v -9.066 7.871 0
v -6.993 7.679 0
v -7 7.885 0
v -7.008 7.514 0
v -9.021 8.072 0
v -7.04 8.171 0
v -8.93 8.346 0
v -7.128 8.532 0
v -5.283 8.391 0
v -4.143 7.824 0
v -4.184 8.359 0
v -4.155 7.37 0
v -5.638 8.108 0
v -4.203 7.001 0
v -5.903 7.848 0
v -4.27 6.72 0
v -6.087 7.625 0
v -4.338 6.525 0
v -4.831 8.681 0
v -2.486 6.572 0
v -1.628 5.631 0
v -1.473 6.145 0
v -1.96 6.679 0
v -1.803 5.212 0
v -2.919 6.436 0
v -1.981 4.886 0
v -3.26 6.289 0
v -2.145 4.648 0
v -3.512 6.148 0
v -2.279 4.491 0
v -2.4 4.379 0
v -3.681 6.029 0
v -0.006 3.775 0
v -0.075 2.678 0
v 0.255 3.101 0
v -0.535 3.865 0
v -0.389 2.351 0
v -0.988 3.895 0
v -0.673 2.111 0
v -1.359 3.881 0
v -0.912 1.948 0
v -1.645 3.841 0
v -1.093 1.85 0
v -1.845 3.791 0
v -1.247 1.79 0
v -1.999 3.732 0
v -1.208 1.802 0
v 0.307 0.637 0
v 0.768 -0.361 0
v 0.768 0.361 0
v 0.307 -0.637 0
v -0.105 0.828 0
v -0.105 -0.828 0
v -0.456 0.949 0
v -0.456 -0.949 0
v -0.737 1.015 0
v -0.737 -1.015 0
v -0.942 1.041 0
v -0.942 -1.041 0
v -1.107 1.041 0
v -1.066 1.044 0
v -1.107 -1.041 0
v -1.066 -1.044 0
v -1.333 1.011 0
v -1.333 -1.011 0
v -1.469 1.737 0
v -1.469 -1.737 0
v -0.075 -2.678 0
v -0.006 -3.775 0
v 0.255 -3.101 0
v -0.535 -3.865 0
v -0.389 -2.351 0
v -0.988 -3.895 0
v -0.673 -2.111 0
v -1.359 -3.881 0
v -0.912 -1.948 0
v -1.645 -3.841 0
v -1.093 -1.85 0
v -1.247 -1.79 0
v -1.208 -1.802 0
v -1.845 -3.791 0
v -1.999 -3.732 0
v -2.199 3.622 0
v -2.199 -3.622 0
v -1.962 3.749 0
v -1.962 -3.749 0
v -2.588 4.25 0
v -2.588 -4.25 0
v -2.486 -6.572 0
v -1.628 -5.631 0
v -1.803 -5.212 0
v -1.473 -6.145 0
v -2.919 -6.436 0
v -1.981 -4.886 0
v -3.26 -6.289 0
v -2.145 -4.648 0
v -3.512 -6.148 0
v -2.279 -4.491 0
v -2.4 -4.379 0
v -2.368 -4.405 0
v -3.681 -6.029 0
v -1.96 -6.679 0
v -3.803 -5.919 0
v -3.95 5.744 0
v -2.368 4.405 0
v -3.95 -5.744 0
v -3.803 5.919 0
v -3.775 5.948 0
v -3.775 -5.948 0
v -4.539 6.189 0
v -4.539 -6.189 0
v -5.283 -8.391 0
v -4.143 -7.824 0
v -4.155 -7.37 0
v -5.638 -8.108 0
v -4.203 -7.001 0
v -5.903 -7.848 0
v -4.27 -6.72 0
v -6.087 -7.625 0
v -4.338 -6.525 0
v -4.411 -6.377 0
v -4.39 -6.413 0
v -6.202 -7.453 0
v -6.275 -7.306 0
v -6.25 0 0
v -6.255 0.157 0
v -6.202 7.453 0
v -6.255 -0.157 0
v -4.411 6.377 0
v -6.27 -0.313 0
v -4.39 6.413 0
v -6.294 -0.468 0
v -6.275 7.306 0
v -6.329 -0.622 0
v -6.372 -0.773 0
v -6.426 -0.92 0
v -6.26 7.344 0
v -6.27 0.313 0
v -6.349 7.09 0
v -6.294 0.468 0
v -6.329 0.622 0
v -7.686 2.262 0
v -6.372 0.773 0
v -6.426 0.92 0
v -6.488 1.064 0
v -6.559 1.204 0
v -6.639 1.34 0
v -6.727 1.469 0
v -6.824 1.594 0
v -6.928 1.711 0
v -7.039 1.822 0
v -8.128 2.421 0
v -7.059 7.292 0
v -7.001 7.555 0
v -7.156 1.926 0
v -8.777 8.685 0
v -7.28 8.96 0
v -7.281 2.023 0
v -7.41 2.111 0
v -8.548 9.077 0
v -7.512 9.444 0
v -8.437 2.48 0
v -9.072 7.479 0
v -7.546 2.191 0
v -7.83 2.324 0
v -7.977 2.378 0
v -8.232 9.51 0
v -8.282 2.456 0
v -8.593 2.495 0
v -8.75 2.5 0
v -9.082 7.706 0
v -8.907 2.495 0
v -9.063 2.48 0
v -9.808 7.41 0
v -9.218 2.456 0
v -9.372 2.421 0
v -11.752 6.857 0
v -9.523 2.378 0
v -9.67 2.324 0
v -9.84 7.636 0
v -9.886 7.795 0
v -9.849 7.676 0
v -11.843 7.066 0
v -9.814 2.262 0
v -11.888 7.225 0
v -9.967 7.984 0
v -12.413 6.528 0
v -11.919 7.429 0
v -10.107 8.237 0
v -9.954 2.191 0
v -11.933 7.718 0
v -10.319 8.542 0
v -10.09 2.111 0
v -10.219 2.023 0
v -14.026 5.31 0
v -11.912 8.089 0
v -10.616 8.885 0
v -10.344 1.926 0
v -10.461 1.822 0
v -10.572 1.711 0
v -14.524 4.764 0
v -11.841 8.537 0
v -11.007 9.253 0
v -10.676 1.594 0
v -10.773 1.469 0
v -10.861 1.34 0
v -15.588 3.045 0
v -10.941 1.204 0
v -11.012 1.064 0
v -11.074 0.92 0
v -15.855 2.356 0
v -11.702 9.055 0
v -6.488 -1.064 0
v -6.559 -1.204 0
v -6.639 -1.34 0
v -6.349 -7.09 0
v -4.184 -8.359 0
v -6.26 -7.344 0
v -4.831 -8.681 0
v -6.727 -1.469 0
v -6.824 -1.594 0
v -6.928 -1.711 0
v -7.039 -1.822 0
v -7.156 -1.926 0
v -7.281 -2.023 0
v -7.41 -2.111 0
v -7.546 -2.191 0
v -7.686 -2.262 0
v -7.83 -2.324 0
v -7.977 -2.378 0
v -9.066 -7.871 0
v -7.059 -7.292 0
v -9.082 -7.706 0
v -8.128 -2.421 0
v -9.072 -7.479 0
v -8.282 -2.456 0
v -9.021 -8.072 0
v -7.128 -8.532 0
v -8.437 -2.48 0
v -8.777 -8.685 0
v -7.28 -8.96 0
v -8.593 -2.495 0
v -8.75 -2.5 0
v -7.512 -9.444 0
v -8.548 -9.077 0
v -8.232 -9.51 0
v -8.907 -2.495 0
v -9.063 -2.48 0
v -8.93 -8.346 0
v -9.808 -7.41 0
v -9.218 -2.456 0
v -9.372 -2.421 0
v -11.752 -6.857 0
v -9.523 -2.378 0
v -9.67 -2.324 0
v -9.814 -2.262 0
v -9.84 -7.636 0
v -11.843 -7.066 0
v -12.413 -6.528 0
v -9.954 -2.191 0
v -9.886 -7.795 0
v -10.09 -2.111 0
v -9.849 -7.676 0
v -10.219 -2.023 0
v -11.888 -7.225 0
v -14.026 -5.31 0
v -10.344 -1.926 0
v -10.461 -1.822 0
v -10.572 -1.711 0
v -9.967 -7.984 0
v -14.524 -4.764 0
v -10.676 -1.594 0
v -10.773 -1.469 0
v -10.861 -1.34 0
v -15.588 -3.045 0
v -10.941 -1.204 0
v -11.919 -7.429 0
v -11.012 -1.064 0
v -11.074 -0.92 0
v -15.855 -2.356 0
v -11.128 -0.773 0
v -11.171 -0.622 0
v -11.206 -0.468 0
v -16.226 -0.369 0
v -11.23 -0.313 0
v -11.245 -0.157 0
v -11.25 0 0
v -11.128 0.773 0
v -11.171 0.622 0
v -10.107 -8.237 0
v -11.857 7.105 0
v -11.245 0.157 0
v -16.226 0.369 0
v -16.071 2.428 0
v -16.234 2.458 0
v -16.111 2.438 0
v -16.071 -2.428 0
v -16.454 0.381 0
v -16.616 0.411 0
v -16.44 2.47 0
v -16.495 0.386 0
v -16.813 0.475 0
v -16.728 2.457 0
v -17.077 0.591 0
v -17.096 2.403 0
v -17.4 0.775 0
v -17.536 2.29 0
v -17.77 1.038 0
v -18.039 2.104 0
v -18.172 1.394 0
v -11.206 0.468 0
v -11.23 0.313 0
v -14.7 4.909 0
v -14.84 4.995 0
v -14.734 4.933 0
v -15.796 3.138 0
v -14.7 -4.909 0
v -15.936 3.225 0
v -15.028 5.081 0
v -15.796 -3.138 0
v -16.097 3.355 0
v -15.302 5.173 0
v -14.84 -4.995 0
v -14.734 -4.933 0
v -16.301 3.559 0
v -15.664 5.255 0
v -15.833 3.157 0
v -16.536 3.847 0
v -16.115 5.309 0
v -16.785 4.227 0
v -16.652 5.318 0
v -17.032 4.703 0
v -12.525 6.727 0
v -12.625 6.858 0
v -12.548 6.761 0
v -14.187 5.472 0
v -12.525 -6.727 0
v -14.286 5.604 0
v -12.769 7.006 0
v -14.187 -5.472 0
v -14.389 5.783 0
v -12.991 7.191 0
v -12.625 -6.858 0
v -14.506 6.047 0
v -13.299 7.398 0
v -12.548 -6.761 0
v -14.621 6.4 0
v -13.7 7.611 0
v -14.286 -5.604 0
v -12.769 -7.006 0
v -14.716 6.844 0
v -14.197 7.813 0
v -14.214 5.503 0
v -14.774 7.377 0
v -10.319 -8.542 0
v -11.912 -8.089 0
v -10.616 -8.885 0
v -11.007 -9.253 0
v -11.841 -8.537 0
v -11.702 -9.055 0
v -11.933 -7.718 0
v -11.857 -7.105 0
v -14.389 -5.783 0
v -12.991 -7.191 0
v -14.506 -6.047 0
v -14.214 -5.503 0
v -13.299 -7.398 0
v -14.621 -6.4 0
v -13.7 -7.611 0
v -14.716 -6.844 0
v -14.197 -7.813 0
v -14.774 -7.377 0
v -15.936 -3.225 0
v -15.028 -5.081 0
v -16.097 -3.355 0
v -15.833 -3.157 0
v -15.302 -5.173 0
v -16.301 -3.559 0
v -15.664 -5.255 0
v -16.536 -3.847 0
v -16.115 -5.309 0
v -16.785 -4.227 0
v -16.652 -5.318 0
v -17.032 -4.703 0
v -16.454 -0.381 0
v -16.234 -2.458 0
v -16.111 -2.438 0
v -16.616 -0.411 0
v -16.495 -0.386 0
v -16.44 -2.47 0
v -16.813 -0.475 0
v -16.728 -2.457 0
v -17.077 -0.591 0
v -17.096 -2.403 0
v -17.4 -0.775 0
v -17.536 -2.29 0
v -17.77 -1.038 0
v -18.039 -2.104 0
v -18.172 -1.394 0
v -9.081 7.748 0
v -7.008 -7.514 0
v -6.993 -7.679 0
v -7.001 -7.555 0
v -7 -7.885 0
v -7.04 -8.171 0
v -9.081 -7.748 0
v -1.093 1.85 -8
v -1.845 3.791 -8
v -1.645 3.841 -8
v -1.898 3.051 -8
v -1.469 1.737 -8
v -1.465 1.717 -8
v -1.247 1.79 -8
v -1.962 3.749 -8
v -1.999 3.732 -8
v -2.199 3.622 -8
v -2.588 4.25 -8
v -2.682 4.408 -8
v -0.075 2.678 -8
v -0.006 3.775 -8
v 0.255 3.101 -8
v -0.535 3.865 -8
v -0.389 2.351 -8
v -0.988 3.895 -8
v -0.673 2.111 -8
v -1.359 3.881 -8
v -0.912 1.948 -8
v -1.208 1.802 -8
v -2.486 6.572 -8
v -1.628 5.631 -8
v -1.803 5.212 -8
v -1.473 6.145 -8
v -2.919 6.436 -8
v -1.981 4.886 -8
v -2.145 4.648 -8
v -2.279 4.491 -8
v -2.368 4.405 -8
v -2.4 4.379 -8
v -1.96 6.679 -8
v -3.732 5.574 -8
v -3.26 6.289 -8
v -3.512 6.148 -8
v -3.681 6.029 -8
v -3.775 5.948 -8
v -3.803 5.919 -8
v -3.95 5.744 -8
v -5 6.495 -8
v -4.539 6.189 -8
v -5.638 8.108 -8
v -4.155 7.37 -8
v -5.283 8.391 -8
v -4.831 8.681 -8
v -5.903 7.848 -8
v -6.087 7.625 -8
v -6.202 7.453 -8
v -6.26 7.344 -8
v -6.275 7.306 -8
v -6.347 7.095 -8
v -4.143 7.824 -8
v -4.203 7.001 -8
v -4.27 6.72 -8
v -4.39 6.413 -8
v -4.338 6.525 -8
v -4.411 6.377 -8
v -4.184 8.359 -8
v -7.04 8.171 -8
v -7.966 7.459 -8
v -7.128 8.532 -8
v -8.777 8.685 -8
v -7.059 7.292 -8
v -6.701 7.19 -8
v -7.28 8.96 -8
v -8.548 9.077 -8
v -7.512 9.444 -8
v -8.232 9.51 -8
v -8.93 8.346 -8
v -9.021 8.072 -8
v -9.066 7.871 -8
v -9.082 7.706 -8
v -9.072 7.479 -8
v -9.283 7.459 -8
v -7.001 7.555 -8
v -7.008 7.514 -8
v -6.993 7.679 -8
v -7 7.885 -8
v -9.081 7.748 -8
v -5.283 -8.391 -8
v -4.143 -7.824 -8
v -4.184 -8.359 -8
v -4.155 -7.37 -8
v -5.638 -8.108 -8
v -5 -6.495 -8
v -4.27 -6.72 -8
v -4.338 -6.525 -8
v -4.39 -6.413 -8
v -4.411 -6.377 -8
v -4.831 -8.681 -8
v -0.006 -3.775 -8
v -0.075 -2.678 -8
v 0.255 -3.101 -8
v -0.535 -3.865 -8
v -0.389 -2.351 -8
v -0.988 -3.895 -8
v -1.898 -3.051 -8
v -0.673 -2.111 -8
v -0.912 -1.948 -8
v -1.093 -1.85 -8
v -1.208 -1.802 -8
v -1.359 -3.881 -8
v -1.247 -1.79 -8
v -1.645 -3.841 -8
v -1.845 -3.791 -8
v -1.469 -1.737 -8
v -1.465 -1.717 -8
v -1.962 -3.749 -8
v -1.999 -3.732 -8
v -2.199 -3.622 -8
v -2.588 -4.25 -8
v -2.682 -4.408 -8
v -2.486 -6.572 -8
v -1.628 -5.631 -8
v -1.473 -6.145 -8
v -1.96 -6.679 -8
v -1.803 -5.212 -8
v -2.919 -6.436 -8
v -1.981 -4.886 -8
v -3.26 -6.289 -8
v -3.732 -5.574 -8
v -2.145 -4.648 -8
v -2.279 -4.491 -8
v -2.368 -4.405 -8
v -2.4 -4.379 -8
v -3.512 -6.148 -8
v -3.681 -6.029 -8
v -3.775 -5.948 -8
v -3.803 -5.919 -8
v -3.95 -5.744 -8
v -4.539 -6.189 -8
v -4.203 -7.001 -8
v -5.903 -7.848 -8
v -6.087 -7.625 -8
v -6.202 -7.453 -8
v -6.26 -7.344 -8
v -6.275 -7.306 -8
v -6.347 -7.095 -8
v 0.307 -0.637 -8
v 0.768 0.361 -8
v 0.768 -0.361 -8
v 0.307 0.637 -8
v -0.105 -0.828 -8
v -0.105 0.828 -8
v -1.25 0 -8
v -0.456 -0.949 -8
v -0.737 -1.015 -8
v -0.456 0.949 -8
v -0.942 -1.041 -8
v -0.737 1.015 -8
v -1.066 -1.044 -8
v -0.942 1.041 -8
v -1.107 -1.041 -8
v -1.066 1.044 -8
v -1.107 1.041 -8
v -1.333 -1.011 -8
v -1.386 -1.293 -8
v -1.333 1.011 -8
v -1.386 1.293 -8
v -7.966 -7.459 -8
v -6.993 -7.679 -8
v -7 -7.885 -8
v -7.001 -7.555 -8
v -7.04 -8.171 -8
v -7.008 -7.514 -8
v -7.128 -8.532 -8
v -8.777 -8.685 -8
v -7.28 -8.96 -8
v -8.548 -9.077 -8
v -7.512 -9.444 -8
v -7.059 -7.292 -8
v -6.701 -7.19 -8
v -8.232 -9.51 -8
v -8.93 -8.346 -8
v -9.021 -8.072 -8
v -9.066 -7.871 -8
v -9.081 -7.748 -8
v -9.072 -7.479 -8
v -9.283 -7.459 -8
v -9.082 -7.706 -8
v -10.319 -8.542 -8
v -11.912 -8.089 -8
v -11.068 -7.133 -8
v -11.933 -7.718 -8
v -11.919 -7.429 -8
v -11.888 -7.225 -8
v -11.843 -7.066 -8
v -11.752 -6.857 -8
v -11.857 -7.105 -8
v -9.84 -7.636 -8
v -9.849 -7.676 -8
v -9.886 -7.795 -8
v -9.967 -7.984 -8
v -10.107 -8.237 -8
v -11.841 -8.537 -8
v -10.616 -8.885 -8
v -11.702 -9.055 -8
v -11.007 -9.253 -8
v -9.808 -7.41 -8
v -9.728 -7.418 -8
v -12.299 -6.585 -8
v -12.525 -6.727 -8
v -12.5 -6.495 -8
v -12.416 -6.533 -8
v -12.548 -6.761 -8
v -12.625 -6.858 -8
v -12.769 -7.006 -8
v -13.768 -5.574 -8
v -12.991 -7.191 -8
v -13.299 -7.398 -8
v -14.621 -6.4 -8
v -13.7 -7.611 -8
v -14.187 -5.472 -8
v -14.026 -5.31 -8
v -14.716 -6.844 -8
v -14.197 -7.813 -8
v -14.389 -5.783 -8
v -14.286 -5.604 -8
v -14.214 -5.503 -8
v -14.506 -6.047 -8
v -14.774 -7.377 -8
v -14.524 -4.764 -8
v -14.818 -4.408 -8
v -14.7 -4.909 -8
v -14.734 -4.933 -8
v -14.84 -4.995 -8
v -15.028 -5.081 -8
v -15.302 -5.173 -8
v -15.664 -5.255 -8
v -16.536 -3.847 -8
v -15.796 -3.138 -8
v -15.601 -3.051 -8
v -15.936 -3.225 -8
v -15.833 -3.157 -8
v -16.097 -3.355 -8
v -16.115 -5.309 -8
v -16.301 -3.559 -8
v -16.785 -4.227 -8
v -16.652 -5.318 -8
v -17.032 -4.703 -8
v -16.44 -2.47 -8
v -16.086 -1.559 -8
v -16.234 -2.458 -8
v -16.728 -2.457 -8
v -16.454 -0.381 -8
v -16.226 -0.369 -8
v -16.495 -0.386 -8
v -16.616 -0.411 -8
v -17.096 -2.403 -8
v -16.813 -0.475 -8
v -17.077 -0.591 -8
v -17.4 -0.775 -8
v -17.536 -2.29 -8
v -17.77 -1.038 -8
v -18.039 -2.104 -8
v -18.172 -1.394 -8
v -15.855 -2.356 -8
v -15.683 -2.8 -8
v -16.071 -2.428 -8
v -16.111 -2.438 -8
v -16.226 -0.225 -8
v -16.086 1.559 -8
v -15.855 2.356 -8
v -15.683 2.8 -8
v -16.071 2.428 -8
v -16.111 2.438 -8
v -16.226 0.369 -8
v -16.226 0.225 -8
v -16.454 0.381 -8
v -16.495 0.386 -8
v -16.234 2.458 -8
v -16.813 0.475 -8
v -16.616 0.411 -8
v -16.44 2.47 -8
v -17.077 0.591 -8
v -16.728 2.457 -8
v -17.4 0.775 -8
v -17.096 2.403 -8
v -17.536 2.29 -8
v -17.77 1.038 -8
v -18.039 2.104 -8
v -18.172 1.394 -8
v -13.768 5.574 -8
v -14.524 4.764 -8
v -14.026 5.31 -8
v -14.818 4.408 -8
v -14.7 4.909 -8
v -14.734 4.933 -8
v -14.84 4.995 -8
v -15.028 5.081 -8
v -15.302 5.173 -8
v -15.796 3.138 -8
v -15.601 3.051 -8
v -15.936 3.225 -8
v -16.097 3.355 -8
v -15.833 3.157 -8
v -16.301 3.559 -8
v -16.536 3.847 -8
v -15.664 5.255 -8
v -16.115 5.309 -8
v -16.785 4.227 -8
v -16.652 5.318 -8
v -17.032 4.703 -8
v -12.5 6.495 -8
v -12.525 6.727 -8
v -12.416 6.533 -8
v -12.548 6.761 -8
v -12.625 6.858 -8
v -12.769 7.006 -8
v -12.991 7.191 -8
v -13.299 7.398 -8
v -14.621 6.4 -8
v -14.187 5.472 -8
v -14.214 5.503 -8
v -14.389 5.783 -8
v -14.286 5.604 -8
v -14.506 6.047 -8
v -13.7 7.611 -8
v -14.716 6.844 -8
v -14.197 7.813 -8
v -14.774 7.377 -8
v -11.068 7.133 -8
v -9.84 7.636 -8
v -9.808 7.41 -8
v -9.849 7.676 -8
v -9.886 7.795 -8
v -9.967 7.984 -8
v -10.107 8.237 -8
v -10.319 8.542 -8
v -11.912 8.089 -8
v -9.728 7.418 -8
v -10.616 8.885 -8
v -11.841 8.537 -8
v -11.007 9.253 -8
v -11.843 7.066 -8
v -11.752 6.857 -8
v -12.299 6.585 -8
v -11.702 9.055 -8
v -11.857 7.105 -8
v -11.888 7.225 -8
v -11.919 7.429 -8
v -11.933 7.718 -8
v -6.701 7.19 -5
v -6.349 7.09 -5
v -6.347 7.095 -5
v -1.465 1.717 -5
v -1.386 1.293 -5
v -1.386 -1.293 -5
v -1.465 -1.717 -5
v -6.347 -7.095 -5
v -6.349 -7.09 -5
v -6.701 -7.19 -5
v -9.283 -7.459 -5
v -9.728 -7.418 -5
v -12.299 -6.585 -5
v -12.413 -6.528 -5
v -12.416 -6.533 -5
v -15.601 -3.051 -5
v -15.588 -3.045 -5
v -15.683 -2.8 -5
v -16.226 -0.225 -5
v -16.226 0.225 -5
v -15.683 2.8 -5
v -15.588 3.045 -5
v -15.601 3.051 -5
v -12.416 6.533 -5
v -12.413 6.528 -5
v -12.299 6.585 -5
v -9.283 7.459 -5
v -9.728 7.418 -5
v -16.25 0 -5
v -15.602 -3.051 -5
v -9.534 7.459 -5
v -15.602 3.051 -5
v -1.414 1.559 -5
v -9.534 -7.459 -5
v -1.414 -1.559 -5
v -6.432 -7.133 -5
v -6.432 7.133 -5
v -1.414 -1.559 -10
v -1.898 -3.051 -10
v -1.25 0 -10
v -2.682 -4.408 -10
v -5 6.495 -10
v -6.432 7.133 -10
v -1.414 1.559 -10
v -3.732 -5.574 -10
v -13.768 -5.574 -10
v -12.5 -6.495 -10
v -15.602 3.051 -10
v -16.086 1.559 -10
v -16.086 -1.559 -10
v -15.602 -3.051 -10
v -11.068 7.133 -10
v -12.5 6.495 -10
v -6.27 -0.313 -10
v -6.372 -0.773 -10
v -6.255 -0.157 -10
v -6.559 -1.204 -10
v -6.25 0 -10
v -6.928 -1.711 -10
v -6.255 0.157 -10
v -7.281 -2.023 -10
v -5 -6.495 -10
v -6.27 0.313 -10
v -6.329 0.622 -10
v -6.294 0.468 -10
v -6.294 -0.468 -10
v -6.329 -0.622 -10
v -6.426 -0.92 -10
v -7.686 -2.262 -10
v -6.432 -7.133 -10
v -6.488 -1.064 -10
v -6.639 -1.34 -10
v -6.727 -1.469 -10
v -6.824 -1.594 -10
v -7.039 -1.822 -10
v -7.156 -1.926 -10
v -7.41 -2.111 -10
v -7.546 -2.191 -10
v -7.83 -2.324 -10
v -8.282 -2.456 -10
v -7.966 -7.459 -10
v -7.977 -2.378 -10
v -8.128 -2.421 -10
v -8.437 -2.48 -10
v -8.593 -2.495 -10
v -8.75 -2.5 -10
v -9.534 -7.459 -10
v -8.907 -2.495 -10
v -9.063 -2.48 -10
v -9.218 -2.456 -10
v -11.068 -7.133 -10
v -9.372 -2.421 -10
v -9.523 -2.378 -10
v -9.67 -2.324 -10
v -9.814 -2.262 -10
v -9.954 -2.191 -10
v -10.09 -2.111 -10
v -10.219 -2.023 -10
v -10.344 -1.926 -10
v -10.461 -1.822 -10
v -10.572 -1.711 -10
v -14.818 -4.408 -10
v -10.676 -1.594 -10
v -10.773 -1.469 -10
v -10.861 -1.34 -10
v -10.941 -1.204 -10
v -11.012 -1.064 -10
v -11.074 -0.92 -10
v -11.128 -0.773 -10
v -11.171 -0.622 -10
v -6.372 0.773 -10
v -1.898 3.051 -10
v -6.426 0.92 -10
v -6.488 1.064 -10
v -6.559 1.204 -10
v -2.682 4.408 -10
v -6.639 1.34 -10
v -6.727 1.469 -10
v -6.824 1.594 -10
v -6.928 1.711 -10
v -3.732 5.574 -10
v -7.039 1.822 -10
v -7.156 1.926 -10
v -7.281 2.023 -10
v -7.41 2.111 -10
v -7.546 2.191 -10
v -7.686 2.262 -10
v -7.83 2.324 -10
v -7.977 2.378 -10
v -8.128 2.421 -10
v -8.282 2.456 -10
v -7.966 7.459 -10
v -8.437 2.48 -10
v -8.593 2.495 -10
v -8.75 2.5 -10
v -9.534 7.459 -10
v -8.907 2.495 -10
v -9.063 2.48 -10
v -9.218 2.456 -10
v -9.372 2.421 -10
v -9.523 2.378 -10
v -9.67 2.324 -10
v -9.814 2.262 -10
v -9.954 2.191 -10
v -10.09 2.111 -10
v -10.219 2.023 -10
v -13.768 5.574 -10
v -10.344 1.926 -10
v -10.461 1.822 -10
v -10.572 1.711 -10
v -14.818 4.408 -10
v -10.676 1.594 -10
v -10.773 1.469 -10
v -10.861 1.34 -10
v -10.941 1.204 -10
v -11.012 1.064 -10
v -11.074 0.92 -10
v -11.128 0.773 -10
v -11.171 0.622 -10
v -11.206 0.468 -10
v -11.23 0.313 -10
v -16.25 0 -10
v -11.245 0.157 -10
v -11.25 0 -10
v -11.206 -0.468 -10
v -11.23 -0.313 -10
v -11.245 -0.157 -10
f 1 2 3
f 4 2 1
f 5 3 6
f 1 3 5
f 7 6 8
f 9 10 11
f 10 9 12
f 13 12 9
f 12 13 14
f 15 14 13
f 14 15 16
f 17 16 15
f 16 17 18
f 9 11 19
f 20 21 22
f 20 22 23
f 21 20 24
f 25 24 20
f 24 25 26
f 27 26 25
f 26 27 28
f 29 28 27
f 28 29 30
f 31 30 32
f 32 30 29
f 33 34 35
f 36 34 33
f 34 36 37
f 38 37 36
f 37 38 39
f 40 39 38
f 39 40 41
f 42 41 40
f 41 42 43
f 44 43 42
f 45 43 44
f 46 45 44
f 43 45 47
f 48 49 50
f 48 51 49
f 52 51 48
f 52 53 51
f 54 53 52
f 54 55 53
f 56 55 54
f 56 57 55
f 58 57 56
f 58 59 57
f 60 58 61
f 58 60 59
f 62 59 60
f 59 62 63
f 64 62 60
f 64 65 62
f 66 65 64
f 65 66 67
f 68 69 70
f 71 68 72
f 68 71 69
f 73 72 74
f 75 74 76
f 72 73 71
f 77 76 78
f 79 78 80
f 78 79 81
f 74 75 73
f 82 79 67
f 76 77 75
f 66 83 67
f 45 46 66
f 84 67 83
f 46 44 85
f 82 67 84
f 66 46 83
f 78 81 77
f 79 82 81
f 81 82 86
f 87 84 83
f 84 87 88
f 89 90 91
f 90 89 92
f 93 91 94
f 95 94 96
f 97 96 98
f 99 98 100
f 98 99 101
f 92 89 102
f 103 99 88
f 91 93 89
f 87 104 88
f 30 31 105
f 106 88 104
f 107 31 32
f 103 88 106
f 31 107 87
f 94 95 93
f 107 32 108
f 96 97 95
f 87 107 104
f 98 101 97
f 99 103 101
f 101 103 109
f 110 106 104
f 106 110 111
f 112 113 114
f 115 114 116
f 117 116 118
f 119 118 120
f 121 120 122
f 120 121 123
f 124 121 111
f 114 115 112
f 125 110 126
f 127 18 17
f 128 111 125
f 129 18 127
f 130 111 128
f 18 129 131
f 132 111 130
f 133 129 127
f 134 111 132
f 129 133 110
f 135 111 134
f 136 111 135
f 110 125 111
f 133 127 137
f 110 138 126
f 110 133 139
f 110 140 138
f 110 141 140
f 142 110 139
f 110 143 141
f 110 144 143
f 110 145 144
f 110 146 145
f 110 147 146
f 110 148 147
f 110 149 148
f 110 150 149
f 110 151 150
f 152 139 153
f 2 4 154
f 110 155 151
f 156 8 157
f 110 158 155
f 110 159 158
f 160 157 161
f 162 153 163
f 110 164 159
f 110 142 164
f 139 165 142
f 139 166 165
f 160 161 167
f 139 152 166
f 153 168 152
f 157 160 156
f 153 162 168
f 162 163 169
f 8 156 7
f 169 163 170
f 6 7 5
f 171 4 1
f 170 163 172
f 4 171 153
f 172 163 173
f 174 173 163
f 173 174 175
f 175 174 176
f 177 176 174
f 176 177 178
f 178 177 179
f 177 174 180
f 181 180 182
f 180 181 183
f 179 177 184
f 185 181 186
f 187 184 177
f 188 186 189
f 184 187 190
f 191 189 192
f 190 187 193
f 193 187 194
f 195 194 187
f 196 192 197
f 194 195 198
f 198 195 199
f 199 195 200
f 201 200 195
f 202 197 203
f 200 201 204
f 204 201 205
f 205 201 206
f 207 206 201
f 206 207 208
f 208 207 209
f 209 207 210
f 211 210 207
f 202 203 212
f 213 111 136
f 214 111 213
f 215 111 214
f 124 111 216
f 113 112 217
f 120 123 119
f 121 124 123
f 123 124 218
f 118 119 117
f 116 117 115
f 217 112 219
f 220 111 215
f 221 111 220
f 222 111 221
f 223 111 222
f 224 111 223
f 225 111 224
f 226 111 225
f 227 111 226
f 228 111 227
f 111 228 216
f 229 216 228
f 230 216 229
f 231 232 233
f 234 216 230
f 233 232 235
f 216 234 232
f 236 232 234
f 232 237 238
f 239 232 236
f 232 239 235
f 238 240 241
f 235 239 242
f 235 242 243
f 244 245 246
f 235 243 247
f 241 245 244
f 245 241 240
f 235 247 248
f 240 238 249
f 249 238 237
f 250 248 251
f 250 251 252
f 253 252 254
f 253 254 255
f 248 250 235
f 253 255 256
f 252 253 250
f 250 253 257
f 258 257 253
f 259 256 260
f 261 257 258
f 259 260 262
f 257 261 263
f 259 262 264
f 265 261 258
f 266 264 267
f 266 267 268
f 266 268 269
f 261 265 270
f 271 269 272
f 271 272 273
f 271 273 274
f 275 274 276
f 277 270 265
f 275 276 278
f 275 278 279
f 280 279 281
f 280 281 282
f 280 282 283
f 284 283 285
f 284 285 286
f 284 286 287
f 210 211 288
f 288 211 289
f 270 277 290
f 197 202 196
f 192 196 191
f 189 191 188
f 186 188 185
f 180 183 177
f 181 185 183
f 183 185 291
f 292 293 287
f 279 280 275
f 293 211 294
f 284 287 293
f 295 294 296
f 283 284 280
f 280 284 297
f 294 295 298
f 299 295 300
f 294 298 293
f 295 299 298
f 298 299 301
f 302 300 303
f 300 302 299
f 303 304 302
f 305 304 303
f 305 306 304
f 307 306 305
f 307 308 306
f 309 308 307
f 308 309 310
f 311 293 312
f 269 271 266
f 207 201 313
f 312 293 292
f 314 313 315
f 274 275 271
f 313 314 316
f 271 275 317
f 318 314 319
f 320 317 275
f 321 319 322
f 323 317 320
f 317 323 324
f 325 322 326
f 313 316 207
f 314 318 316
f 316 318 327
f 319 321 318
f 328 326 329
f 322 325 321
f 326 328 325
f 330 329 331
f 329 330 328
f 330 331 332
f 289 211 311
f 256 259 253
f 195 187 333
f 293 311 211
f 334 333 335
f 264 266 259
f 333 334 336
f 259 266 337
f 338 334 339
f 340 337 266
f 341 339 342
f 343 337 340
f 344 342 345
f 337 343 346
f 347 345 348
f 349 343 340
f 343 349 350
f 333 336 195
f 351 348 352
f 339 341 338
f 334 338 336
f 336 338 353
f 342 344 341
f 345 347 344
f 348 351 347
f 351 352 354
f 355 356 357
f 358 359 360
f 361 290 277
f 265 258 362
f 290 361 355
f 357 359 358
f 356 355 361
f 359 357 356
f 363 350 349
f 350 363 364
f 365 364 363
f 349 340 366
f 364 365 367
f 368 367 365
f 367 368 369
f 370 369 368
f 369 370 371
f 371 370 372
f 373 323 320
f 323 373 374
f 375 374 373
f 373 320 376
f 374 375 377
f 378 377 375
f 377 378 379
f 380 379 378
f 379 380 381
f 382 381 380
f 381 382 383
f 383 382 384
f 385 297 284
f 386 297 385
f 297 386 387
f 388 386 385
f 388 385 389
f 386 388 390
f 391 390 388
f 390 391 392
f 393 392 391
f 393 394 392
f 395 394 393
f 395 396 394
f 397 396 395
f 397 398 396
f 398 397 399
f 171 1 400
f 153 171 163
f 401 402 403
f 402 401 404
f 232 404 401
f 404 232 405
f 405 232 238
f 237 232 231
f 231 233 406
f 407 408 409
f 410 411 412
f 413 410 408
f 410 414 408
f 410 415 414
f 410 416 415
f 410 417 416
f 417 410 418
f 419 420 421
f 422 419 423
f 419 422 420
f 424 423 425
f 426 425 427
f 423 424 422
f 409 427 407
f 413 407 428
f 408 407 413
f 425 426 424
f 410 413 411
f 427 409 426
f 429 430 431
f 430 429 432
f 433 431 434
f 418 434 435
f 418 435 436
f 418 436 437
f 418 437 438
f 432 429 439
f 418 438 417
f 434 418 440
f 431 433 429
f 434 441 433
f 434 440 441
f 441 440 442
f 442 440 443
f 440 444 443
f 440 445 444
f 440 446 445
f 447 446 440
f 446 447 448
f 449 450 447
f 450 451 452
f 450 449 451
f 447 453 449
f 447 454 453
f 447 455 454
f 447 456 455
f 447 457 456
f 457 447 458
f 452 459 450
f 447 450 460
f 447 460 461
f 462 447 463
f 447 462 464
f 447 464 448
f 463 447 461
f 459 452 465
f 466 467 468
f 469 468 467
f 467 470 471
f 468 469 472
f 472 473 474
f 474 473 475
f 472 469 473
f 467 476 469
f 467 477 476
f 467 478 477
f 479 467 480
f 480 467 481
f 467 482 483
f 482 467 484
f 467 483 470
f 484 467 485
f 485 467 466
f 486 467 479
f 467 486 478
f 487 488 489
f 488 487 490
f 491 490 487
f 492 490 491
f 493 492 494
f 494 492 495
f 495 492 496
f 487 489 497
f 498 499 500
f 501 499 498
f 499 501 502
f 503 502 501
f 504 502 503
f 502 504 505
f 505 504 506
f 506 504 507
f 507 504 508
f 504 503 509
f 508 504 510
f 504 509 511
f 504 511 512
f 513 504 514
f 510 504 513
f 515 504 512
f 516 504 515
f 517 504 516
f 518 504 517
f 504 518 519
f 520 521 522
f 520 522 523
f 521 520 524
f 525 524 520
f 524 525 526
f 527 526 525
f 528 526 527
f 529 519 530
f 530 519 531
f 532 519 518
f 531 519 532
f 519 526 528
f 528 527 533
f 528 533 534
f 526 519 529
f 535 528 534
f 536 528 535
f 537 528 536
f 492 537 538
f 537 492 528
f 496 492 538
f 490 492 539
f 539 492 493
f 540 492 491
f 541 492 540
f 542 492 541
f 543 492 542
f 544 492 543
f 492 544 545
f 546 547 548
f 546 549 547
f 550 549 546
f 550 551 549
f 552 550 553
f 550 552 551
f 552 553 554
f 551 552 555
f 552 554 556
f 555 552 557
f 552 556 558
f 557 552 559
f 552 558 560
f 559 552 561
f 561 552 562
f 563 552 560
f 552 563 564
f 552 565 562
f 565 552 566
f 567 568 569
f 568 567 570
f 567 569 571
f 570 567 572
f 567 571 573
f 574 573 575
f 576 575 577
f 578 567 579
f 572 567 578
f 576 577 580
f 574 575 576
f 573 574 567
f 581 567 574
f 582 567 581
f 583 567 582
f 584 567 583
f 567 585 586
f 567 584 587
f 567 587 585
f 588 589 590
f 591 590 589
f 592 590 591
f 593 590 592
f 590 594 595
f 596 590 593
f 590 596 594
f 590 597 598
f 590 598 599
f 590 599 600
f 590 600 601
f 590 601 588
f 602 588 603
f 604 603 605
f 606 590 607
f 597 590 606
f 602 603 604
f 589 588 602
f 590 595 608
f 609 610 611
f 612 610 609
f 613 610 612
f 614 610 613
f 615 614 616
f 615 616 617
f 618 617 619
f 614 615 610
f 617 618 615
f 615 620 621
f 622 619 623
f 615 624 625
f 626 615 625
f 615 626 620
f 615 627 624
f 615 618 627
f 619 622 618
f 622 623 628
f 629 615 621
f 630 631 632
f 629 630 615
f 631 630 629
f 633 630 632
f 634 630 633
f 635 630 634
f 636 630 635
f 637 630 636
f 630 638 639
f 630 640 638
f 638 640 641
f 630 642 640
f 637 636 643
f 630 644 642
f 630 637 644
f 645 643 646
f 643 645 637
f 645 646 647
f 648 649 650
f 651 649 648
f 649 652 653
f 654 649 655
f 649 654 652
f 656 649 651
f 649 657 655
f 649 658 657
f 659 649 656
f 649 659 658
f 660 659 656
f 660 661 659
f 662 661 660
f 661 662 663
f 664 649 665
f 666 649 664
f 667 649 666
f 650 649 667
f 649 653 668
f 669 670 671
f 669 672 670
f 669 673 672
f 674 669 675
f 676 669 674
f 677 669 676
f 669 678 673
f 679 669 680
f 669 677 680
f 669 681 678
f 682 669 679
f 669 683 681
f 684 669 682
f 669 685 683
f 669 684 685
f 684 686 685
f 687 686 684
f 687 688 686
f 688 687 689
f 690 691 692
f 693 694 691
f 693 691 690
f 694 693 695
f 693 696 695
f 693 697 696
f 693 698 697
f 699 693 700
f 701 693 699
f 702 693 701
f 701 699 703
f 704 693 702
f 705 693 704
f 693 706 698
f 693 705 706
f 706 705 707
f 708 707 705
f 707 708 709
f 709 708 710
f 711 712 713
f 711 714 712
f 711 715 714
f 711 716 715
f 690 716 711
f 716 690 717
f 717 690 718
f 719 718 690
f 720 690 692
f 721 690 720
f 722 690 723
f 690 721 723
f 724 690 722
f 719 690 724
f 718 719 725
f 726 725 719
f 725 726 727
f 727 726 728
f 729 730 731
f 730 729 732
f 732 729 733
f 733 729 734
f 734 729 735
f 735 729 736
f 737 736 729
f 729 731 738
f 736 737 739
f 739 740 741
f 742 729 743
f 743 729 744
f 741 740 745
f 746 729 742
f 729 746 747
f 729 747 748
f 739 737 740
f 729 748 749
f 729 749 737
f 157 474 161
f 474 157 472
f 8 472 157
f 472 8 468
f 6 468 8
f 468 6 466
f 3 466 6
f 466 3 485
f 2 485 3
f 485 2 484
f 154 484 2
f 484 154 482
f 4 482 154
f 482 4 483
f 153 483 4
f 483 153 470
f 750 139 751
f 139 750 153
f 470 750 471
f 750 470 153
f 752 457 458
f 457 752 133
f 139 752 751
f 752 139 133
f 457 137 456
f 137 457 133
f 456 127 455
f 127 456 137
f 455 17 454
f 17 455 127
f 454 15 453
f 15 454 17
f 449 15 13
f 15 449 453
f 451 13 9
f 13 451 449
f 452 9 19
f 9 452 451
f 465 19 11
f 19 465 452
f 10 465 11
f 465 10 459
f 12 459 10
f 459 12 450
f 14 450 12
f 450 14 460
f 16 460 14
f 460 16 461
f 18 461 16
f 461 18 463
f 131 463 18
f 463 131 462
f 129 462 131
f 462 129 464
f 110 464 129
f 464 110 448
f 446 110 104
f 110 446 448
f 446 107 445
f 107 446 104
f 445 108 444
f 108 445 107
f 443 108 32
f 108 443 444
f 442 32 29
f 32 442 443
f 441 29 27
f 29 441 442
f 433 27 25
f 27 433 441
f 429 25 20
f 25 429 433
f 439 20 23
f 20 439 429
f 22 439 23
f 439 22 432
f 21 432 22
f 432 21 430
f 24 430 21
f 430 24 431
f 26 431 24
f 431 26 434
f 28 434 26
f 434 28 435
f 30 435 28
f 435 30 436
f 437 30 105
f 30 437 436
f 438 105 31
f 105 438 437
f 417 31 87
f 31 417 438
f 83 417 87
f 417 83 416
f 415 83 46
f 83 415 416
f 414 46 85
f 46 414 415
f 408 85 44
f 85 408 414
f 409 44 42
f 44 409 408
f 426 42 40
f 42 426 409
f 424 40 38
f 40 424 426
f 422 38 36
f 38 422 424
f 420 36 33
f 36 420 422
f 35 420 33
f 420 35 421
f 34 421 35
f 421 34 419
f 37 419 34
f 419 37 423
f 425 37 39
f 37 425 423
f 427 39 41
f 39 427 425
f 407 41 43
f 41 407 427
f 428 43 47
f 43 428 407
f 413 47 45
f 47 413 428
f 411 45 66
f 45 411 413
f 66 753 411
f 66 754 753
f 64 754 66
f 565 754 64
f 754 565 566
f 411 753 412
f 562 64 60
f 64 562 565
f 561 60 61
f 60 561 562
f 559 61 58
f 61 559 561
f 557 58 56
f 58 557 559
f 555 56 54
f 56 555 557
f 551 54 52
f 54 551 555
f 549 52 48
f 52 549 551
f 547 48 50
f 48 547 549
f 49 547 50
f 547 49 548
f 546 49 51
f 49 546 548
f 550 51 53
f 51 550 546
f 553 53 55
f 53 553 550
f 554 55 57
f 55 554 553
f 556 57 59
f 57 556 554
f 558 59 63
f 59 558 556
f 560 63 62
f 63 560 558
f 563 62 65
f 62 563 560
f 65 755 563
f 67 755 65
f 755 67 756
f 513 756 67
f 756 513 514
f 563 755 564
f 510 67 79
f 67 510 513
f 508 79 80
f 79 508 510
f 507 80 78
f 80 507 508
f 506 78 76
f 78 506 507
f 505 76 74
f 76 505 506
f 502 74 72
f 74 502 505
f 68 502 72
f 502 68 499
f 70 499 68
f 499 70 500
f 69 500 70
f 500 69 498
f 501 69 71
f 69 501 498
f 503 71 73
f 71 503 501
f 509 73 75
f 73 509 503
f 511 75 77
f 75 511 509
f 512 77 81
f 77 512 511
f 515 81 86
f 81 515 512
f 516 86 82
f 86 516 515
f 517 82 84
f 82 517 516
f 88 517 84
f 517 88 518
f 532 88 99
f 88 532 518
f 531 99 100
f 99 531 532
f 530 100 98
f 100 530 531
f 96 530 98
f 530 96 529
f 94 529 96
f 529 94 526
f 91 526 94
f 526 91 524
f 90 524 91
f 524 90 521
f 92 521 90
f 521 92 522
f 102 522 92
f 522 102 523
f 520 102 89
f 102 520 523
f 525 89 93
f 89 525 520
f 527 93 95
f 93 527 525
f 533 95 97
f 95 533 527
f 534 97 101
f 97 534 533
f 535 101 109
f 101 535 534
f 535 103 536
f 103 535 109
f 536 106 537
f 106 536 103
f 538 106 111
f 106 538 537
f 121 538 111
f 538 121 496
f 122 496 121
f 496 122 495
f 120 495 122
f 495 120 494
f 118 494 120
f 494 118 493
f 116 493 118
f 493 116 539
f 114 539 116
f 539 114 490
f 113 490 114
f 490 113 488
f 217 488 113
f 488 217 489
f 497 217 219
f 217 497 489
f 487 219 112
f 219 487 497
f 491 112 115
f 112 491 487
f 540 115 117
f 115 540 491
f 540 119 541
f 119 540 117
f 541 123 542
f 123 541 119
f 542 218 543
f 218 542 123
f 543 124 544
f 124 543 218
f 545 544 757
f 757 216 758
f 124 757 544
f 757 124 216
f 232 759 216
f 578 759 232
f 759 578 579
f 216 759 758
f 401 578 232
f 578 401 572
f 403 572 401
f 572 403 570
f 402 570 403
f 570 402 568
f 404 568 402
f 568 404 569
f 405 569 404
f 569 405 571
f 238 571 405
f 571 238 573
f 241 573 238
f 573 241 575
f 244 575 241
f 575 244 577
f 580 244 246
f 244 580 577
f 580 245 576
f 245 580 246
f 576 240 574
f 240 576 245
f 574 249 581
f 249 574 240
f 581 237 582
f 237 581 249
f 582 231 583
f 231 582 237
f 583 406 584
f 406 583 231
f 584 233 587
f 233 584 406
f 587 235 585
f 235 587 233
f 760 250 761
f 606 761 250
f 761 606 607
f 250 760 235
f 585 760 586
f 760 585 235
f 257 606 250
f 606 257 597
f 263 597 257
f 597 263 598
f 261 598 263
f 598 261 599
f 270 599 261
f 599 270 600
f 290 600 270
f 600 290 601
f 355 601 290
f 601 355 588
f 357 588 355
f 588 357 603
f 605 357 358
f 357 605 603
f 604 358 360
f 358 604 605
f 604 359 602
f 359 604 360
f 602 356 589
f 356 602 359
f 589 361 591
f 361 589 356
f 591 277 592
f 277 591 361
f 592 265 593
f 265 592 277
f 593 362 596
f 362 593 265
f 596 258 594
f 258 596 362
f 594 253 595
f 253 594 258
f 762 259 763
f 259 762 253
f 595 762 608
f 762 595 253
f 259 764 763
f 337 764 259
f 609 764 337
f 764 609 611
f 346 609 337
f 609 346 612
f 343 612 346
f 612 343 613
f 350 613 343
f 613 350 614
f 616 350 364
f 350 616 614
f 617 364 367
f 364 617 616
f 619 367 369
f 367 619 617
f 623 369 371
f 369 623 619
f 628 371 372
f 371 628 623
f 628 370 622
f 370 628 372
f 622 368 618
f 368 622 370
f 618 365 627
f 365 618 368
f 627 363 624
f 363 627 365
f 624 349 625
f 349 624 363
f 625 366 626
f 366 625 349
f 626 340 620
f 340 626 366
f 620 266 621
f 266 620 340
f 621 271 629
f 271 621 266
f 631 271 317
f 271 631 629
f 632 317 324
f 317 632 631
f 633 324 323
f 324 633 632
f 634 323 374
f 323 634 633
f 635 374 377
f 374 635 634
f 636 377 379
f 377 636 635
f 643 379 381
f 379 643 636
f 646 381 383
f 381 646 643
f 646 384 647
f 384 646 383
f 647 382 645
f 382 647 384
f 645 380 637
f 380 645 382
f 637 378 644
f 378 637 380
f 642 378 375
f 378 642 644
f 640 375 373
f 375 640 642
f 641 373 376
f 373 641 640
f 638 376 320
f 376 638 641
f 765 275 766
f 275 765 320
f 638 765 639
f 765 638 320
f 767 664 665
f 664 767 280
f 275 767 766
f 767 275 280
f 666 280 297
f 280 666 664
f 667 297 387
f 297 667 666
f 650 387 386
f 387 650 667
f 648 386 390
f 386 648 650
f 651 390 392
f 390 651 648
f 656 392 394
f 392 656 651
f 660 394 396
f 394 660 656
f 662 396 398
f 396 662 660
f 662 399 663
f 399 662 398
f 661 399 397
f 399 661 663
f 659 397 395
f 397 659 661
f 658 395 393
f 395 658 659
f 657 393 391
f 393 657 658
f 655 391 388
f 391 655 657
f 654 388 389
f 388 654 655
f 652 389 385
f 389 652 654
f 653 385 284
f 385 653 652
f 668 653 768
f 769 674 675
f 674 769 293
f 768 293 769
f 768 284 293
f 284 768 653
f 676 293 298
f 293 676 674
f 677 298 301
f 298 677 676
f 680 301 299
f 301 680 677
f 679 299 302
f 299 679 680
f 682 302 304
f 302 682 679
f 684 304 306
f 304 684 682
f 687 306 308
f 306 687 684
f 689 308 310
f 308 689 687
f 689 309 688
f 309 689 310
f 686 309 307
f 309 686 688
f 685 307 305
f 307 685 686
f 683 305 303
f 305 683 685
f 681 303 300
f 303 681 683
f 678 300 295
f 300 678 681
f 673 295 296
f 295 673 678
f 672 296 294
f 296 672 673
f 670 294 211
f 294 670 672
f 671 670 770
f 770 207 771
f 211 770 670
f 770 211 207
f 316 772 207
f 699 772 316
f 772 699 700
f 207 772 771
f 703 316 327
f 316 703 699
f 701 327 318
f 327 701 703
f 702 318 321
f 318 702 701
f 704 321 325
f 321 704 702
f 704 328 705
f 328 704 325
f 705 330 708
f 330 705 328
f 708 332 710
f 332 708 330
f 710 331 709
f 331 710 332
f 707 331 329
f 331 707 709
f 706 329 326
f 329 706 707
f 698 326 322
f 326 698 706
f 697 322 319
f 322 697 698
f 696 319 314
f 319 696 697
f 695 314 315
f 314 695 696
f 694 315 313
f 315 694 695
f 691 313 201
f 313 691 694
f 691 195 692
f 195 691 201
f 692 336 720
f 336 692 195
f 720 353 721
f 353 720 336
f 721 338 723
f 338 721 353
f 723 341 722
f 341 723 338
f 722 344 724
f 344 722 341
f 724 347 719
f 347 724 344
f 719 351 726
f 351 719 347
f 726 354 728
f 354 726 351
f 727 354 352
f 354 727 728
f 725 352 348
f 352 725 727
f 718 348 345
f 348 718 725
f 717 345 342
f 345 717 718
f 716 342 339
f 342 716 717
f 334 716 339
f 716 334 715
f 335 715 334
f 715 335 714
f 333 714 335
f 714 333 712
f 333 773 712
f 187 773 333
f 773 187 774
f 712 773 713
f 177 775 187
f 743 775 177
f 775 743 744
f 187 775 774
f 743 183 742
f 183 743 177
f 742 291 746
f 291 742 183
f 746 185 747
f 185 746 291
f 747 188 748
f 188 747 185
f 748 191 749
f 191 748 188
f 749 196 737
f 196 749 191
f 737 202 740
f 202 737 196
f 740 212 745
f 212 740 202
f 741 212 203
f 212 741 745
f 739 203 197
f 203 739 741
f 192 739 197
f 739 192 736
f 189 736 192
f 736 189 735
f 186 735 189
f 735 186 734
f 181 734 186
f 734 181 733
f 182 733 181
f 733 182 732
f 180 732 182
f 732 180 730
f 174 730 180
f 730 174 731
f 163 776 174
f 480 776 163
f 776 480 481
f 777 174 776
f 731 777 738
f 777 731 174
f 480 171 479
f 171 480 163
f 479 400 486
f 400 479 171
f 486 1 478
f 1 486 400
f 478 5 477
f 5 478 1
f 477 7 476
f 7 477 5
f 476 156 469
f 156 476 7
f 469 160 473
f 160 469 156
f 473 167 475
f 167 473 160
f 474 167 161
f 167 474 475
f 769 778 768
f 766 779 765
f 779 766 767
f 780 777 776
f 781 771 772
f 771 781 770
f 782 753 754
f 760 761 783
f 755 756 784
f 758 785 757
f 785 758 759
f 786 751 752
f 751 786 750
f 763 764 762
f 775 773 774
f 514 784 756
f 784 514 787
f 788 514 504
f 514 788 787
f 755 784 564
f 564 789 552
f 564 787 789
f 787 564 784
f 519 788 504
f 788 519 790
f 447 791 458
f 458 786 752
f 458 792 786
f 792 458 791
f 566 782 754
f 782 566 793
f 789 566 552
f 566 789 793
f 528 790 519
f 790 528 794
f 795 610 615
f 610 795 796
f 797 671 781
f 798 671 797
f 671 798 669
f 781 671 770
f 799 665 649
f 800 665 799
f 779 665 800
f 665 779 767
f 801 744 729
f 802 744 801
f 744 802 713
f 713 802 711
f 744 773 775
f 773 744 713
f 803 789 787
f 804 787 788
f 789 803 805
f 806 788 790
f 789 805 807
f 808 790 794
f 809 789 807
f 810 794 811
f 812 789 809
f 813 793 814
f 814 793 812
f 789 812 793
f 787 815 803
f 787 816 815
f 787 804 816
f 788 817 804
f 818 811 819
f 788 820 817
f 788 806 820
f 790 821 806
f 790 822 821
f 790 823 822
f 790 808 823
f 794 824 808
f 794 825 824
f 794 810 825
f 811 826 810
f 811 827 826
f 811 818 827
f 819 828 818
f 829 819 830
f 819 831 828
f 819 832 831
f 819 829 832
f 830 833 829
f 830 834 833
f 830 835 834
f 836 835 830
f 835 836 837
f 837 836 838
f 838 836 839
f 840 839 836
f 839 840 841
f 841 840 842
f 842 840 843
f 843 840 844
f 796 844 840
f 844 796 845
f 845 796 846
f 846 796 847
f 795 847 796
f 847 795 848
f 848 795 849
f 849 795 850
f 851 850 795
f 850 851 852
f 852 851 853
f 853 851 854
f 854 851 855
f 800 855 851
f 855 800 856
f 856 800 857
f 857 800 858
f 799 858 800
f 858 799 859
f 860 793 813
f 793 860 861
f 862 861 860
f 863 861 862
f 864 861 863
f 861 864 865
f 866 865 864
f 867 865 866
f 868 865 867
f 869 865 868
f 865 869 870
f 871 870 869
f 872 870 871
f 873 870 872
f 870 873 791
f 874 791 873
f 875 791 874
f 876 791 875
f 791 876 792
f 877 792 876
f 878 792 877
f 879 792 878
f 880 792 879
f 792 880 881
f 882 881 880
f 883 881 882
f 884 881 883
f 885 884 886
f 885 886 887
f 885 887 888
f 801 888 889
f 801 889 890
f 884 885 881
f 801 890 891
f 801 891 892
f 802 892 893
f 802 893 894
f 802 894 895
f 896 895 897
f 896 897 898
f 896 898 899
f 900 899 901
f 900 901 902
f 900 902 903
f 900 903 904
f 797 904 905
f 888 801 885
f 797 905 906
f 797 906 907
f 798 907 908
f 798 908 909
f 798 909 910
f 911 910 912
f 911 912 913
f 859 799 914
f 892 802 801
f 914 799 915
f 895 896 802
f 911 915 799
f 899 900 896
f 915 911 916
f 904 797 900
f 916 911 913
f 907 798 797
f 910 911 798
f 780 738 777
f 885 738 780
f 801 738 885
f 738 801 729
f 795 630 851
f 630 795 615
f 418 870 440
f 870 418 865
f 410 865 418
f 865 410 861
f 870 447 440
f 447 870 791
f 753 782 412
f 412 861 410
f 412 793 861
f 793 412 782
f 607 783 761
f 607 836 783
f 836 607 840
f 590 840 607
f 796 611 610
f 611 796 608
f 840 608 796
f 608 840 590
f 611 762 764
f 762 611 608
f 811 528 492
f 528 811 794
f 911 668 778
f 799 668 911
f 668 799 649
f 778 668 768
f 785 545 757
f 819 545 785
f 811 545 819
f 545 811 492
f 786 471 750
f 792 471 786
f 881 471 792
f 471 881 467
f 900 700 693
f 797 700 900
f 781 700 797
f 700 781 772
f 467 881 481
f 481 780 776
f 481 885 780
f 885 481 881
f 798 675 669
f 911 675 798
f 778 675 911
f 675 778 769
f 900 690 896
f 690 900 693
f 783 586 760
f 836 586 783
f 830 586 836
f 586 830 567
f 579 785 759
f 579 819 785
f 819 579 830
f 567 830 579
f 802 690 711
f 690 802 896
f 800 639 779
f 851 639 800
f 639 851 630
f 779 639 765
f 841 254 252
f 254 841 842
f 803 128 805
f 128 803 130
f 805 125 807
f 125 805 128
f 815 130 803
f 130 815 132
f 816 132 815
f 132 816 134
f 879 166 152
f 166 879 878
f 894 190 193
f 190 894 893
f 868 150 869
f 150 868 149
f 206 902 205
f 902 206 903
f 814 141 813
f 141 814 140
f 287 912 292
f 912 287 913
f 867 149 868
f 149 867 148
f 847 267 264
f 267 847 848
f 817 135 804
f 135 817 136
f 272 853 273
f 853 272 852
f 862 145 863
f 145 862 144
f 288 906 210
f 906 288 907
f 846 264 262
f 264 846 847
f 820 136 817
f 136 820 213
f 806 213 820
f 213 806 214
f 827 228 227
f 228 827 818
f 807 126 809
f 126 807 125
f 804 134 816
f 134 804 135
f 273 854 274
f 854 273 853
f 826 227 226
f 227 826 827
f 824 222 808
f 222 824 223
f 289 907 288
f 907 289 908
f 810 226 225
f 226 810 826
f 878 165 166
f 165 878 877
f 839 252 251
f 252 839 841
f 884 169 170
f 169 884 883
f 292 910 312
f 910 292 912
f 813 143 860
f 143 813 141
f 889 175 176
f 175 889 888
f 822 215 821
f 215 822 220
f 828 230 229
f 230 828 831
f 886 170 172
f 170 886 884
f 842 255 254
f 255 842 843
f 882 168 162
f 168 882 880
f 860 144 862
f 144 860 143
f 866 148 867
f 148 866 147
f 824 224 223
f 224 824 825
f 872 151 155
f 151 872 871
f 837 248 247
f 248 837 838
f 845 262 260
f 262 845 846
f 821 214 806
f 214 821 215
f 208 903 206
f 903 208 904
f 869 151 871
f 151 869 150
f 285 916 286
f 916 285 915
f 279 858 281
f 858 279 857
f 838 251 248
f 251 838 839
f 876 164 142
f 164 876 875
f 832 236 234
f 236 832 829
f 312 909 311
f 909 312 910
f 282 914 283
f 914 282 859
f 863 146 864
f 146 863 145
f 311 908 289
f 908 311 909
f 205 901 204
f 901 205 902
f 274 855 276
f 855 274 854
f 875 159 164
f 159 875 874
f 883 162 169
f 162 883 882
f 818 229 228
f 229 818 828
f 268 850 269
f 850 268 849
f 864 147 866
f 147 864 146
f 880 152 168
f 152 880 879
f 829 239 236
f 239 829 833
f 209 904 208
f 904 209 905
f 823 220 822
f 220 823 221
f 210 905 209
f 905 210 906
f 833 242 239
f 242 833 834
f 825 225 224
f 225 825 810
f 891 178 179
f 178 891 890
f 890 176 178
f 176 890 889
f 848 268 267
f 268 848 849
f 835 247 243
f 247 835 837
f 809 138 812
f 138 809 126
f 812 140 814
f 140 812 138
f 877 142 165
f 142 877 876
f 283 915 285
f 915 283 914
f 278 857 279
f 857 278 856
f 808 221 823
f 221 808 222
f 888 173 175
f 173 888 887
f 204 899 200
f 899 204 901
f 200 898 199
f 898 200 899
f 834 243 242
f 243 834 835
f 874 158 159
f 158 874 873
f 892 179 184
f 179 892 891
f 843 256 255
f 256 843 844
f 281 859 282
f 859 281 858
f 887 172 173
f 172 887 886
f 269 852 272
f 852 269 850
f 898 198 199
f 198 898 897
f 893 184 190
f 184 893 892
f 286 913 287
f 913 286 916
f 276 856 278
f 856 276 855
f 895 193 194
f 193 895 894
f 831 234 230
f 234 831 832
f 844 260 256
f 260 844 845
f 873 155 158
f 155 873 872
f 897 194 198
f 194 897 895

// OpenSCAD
// file: ../settings.scad
// Common settings used by all scad files.

// ALL UNITS IN MILLIMETERS (MM)!!!

$fn = 30;//low-res but fast to render
//$fn = 50;//higher-res but slow to render

pi = 3.1415926535897932384626433832795;

max_footprint = 150; // 15x15 cm

bottom_clearance = 10;
bottom_clearance = 25.4/2+10;
//bottom_clearance = 30;

shell_alpha = 0.215;
//shell_alpha = 1.0;

tolerance = 0.5;

// Flat countersunk M2.5mm x 0.45mm machine screw.
screw_thread_diameter = 2.5;//2.8;//2.75;//2.4?
screw_thread_length = 5;//?
screw_head_diameter = 4.75; // M2.5
//screw_head_diameter = 5.2; // M3
screw_head_height = 1.5;//2;

screw_thread_diameter2 = 2;

unit_thickness = 5;
u = unit_thickness;

shell_thickness = unit_thickness;

// Show flags.
show_platform = 0;
show_head = 1;
show_head_shell = 0;
show_head_electronics_bb = 0;
show_battery = 1;
show_foot_cube = 0;
show_torso = 0;
show_motor = 0;
show_motor_plates = 1;
show_motor_inner_plates = 1;
show_motor_outer_plates = 1;
show_wheel = 0;//obsolete
show_tracks = 1;//
show_track_wheels = 1;
show_caster = 0;
show_rpi = 1;
show_vertical_plates = 1;//
show_horizontal_plates = 1;//
show_caster_plates = 0;//obsolete?
show_camera = 1;
show_screen = 0;
show_edge_mount = 1;
show_sonar_mount = 1;
show_recharge_mount = 1;
show_conduit = 1;
show_torso_shell = 1;
show_recharge_dock = 0;
show_head_tilt_axis = 0;
show_rpi_camera_axis = 0;
show_laser_axis = 0;

head_vertical_angle_tilt = 0;
//head_vertical_angle_tilt = 30;//max
//head_vertical_angle_tilt = 10;

torso_height = 120+20;

base_plate_diameter = max_footprint-unit_thickness*2;
base_plate_frame = 0;

head_height = 50;
head_offset_z = max_footprint/2;
head_middle_cutout = 85;

rpi_with_four_hats_and_clearance = 76;

qrd1114_w = 6.10;
qrd1114_l = 4.39;
qrd1114_h = 4.65;

dock_radius = 10;
dock_gripper_border = 2;
dock_gripper_instep = 0.9;
dock_gripper_cutout_tapper = 50;
dock_receiver_height = 5;

// Patriod Fuel+ 9000 mAh
battery_length = 90;
battery_width = 57;
battery_height = 23;
battery_offset_z = 30;//4;

wheel_diameter = 50;
wheel_offset_x = 65;
wheel_offset_z = wheel_diameter/2;
wheel_axle_diameter = 5;

//caster_diameter = 19.05; // 0.75 inches
caster_diameter = 25.45; // 1 inches
//caster_diameter = 15.875; // 5/8 inches
caster_holder_diameter = 30;//31;
caster_offset_y = base_plate_diameter/2 - caster_holder_diameter/2;

arduino_offset_x = 0;
arduino_offset_y = 0;
arduino_offset_z = 67;
arduino_offset_x2 = 0;
arduino_offset_y2 = -20;
arduino_offset_z2 = torso_height+bottom_clearance;

horizontal_plate_width = unit_thickness*8*2 - unit_thickness*2;
horizontal_plate_depth = unit_thickness*8*2;

vertical_plate_width = horizontal_plate_depth;
vertical_plate_height = unit_thickness*8;
vertical_plate_offset_x = wheel_offset_x-22.5;
vertical_plate_offset_z = vertical_plate_height/2 + unit_thickness/2;

vertical_battery_plate_height = 100 - 15;

caster_plate_width = horizontal_plate_width + unit_thickness*2;
caster_plate_mount_length = unit_thickness*4;
caster_plate_width_minor = caster_holder_diameter;

motor_switch_length = 20;
motor_switch_thickness = 6.5;
motor_switch_height = 11;
motor_switch_height_leads = 23;
motor_switch_on_height =  13.3;
motor_switch_hole_diameter = 2.5;
motor_switch_hole_offset_z = 6.5;//this plus diameter/2 is hole center from switch top
motor_switch_hole_spacing = 7.1;// holes are diameter/2 from this

motor_length = 60;
motor_width = 25;
motor_collar_width = 7;
motor_collar_height = 2.5;
motor_axle_width = 4;
motor_axle_height = 9.5;
motor_offset_x = 10;
//motor_offset_y = motor_width/2+5;
motor_offset_y = unit_thickness*3.5;
motor_offset_z = vertical_plate_height/2 - unit_thickness/2;//4;//30;
motor_mount_holes_dist = 17;
// motor countersink hole
motor_mount_holes_width = 3; // M3
motor_mount_holes_head_height = 2.2;
motor_mount_holes_head_width = 5.8;
motor_bearing_outer_diameter = 10;
motor_bearing_inner_diameter = 5.95;
motor_bearing_thickness = 2.5;

motor_unimount_idler_axle_d = screw_thread_diameter;
//motor_unimount_spacer_depth = 0.1;//too small
motor_unimount_spacer_depth = 0.5;

motor_arm_offset_y = -u*3;
motor_arm_offset_z = u*.5;

motor_plate_width = vertical_plate_width;
motor_plate_height = vertical_plate_height;
motor_plate_thickness = unit_thickness;
motor_plate_offset_z = vertical_plate_offset_z;

motor_plate_middle_thickness = 5;

wheel_hub_offset = u*3;

motor_hole_height_offset = -5;

nylon_spacer_outer_diameter = 6.35;
nylon_spacer_inner_diameter = 3.302;
nylon_spacer_length = 12.7;

track_width = unit_thickness*3;
track_offset_x = -50;
track_offset_z = .1;
//track_wheel_radius = 19;//original
track_wheel_radius = 14;
//track_wheel_hole_radius = (nylon_spacer_outer_diameter+1)/2;
track_wheel_hole_radius = motor_bearing_outer_diameter/2;

track_driver_hole_radius = (motor_axle_width)/2 + 0.1;
track_driver_set_screw_head_d = 4.1;
track_driver_set_screw_shaft_d = 2.4;
//track_wheel_width = 13.5;//original
track_wheel_width = u*2;
track_wheel_width_buffer = u*0.25;
track_offset = 3;        //distance from chassis
track_wheel_offset = track_offset;
//track_length = 250; // see tread_triangle.py, too big
//track_length = 240; // see tread_triangle.py
//track_length = 238; //inc/dec in 10 unit increments so notches match idlers
track_length = 228; //inc/dec in 10 unit increments so notches match idlers
track_radius = track_length/2/pi;
track_wheel_show_fancy = 1;
track_wheel_gap = track_wheel_width + track_wheel_width_buffer*2;
track_axle_bearing_diameter = motor_bearing_inner_diameter - 0.1;
track_tensioner_radius = 12;
track_nut_height = 3.5; //TODO
track_punchout_thickness = 0.25;//should be the same as the minimum layer thickness

head_slew_bearing_outer_diameter = 115;
head_slew_bearing_ring_thickness = 20;
head_slew_bearing_inner_diameter = head_slew_bearing_outer_diameter - head_slew_bearing_ring_thickness;
//head_slew_bearing_hole_diameter = head_slew_bearing_inner_diameter - head_slew_bearing_ring_thickness;
head_slew_bearing_hole_diameter = 12+tolerance; // slip ring https://www.adafruit.com/products/775
//head_slew_bearing_ball_diameter = 5;
head_slew_bearing_ball_diameter = 2.5; //u/2;
head_slew_bearing_height = u;//head_slew_bearing_ball_diameter*2;
head_slew_bearing_gap = 0.5;
head_slew_bearing_slew_gap = 0;
head_slew_bearing_gap_factor = 0.1;

neck_strut_width = u*7;
neck_strut_height = u*18;
neck_strut_spacing = u*8;

show_outer_race = 0;
show_inner_race_a = 1;
show_inner_race_b = 1;
show_balls = 0;
// main file
include <../settings.scad>;
use <parametric_involute_gear_v5.0.scad>;

module make_motor_gear(p){
    gear(number_of_teeth=17,
        circular_pitch=p,
        circles=8);
}

module make_motor_gears(){
	p = 185;
	rotate([180,0,0])
	translate([motor_offset_y/2,0,0]){
	
	    translate([-motor_offset_y,0,0])
	    make_motor_gear(p);
	    
	    //make_motor_gear(p);
	}
}

make_motor_gears();
